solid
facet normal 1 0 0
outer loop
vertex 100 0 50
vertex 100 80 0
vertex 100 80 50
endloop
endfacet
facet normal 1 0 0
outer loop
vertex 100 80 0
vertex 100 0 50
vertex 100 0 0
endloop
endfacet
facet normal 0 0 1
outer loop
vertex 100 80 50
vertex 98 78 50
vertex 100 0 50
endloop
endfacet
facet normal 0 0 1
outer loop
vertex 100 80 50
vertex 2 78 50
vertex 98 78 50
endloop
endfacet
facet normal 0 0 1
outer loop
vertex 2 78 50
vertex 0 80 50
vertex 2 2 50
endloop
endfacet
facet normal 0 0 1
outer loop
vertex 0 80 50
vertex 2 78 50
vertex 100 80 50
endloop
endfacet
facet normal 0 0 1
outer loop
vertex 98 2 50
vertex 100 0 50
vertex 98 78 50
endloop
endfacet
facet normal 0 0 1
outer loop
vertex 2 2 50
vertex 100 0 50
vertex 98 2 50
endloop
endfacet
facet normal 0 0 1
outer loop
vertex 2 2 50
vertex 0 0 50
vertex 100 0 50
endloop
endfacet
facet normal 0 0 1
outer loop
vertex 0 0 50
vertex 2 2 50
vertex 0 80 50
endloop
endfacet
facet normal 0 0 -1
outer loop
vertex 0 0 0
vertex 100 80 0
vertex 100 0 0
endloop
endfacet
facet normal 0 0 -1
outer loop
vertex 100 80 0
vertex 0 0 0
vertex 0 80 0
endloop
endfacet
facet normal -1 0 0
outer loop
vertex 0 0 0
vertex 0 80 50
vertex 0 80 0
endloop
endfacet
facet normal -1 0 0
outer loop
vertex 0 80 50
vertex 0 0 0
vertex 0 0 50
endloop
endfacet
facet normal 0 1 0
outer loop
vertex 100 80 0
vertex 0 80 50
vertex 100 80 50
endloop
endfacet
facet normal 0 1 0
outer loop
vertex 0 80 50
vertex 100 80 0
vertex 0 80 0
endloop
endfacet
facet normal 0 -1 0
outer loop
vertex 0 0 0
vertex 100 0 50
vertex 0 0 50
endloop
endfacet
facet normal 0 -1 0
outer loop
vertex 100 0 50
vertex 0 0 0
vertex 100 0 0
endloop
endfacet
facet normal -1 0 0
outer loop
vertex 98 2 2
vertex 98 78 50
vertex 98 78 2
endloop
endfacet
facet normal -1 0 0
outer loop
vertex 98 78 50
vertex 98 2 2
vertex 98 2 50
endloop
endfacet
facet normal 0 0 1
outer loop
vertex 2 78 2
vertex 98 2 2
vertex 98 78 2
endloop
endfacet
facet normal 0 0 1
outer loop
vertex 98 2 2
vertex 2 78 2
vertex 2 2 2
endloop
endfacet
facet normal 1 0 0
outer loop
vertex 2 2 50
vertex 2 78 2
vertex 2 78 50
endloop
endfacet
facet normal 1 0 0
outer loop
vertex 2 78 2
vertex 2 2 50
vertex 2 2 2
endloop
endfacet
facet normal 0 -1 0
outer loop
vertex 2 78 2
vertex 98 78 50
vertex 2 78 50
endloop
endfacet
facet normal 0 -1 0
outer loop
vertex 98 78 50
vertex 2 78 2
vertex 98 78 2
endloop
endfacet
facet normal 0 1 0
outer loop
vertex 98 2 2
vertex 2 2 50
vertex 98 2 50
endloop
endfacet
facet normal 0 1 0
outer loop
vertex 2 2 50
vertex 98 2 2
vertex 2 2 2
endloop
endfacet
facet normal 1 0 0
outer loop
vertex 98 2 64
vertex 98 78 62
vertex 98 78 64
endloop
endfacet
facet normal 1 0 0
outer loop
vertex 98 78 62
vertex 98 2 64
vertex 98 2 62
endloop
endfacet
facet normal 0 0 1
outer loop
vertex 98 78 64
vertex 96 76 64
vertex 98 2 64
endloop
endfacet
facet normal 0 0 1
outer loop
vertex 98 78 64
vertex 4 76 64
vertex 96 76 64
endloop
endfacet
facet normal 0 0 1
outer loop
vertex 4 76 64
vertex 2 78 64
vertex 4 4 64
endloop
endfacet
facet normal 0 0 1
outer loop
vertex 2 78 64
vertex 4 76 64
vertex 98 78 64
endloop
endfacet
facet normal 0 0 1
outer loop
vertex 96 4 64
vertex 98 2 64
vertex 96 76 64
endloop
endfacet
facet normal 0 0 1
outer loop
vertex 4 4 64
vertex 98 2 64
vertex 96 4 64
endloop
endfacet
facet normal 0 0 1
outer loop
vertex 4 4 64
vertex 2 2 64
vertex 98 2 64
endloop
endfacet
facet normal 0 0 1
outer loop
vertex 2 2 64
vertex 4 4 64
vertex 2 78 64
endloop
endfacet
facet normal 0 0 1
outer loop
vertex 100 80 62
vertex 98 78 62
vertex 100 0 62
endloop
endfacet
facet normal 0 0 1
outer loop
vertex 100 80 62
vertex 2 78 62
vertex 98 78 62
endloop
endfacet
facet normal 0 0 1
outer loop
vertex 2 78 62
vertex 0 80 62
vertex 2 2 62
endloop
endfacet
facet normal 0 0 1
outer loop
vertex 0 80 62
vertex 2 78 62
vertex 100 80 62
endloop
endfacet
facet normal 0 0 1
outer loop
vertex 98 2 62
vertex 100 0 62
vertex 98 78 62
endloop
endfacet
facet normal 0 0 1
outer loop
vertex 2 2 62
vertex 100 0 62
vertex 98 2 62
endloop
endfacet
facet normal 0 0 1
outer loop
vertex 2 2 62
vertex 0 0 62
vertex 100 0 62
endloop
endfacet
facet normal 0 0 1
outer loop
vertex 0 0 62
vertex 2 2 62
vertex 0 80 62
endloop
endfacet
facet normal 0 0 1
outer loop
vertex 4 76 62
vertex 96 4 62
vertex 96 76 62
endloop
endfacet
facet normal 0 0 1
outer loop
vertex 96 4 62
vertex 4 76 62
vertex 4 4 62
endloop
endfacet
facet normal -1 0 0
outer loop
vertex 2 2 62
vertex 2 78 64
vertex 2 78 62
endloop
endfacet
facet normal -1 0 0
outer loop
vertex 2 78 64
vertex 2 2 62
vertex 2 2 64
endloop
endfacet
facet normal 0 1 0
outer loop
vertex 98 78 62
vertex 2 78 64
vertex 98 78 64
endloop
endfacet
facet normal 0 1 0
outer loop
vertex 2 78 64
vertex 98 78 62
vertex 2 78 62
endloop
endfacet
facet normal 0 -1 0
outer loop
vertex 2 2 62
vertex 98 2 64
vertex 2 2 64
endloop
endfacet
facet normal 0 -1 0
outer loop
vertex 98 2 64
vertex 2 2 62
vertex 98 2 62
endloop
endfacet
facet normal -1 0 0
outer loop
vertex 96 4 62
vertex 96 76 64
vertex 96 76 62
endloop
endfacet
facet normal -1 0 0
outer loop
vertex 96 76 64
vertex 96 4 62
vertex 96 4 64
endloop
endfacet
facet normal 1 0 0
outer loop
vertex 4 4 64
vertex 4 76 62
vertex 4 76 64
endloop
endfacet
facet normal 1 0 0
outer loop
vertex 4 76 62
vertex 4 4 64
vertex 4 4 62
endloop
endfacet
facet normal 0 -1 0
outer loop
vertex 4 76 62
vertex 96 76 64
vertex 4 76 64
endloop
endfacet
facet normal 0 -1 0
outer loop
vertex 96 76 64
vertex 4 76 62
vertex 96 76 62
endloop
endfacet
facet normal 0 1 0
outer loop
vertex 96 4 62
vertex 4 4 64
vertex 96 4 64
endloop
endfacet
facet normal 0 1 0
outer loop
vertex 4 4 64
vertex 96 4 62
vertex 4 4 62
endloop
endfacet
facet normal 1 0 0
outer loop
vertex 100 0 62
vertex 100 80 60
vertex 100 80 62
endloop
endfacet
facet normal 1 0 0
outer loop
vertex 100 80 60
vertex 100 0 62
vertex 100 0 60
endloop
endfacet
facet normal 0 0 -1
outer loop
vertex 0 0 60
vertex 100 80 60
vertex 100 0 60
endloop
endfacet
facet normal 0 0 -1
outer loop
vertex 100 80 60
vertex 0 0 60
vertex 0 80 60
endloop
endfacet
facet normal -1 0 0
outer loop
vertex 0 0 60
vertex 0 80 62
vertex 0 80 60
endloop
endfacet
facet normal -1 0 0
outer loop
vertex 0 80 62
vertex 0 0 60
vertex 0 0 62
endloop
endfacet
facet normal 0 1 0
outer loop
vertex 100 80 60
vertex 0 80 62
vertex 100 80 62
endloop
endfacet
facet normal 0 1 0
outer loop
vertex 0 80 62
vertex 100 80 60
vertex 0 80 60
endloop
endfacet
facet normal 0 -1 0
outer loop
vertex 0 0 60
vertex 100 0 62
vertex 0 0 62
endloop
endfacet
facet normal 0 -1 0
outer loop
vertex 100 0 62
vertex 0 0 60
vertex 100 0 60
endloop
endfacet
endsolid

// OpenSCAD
/* 
 * Simple Box with Optional Lid
 * A customizable box that can have a lid
 */

// Parameters - these will be customizable in the UI
$width = 100;           // Width of the box
$depth = 80;            // Depth of the box
$height = 50;           // Height of the box
$wall_thickness = 2;    // Wall thickness
$has_lid = true;        // Whether to include a lid

// Main module
module main() {
    if ($has_lid) {
        box();
        translate([0, 0, $height + 10]) lid();
    } else {
        box();
    }
}

// Box module
module box() {
    difference() {
        // Outer shell
        cube([$width, $depth, $height]);
        
        // Inner cavity
        translate([$wall_thickness, $wall_thickness, $wall_thickness])
            cube([
                $width - 2 * $wall_thickness, 
                $depth - 2 * $wall_thickness, 
                $height
            ]);
    }
}

// Lid module
module lid() {
    union() {
        // Lid base
        cube([$width, $depth, $wall_thickness]);
        
        // Lip for secure fitting
        translate([$wall_thickness, $wall_thickness, $wall_thickness])
            difference() {
                cube([
                    $width - 2 * $wall_thickness, 
                    $depth - 2 * $wall_thickness, 
                    $wall_thickness
                ]);
                
                translate([$wall_thickness, $wall_thickness, 0])
                    cube([
                        $width - 4 * $wall_thickness, 
                        $depth - 4 * $wall_thickness, 
                        $wall_thickness
                    ]);
            }
    }
}

// Execute the main module
main();
